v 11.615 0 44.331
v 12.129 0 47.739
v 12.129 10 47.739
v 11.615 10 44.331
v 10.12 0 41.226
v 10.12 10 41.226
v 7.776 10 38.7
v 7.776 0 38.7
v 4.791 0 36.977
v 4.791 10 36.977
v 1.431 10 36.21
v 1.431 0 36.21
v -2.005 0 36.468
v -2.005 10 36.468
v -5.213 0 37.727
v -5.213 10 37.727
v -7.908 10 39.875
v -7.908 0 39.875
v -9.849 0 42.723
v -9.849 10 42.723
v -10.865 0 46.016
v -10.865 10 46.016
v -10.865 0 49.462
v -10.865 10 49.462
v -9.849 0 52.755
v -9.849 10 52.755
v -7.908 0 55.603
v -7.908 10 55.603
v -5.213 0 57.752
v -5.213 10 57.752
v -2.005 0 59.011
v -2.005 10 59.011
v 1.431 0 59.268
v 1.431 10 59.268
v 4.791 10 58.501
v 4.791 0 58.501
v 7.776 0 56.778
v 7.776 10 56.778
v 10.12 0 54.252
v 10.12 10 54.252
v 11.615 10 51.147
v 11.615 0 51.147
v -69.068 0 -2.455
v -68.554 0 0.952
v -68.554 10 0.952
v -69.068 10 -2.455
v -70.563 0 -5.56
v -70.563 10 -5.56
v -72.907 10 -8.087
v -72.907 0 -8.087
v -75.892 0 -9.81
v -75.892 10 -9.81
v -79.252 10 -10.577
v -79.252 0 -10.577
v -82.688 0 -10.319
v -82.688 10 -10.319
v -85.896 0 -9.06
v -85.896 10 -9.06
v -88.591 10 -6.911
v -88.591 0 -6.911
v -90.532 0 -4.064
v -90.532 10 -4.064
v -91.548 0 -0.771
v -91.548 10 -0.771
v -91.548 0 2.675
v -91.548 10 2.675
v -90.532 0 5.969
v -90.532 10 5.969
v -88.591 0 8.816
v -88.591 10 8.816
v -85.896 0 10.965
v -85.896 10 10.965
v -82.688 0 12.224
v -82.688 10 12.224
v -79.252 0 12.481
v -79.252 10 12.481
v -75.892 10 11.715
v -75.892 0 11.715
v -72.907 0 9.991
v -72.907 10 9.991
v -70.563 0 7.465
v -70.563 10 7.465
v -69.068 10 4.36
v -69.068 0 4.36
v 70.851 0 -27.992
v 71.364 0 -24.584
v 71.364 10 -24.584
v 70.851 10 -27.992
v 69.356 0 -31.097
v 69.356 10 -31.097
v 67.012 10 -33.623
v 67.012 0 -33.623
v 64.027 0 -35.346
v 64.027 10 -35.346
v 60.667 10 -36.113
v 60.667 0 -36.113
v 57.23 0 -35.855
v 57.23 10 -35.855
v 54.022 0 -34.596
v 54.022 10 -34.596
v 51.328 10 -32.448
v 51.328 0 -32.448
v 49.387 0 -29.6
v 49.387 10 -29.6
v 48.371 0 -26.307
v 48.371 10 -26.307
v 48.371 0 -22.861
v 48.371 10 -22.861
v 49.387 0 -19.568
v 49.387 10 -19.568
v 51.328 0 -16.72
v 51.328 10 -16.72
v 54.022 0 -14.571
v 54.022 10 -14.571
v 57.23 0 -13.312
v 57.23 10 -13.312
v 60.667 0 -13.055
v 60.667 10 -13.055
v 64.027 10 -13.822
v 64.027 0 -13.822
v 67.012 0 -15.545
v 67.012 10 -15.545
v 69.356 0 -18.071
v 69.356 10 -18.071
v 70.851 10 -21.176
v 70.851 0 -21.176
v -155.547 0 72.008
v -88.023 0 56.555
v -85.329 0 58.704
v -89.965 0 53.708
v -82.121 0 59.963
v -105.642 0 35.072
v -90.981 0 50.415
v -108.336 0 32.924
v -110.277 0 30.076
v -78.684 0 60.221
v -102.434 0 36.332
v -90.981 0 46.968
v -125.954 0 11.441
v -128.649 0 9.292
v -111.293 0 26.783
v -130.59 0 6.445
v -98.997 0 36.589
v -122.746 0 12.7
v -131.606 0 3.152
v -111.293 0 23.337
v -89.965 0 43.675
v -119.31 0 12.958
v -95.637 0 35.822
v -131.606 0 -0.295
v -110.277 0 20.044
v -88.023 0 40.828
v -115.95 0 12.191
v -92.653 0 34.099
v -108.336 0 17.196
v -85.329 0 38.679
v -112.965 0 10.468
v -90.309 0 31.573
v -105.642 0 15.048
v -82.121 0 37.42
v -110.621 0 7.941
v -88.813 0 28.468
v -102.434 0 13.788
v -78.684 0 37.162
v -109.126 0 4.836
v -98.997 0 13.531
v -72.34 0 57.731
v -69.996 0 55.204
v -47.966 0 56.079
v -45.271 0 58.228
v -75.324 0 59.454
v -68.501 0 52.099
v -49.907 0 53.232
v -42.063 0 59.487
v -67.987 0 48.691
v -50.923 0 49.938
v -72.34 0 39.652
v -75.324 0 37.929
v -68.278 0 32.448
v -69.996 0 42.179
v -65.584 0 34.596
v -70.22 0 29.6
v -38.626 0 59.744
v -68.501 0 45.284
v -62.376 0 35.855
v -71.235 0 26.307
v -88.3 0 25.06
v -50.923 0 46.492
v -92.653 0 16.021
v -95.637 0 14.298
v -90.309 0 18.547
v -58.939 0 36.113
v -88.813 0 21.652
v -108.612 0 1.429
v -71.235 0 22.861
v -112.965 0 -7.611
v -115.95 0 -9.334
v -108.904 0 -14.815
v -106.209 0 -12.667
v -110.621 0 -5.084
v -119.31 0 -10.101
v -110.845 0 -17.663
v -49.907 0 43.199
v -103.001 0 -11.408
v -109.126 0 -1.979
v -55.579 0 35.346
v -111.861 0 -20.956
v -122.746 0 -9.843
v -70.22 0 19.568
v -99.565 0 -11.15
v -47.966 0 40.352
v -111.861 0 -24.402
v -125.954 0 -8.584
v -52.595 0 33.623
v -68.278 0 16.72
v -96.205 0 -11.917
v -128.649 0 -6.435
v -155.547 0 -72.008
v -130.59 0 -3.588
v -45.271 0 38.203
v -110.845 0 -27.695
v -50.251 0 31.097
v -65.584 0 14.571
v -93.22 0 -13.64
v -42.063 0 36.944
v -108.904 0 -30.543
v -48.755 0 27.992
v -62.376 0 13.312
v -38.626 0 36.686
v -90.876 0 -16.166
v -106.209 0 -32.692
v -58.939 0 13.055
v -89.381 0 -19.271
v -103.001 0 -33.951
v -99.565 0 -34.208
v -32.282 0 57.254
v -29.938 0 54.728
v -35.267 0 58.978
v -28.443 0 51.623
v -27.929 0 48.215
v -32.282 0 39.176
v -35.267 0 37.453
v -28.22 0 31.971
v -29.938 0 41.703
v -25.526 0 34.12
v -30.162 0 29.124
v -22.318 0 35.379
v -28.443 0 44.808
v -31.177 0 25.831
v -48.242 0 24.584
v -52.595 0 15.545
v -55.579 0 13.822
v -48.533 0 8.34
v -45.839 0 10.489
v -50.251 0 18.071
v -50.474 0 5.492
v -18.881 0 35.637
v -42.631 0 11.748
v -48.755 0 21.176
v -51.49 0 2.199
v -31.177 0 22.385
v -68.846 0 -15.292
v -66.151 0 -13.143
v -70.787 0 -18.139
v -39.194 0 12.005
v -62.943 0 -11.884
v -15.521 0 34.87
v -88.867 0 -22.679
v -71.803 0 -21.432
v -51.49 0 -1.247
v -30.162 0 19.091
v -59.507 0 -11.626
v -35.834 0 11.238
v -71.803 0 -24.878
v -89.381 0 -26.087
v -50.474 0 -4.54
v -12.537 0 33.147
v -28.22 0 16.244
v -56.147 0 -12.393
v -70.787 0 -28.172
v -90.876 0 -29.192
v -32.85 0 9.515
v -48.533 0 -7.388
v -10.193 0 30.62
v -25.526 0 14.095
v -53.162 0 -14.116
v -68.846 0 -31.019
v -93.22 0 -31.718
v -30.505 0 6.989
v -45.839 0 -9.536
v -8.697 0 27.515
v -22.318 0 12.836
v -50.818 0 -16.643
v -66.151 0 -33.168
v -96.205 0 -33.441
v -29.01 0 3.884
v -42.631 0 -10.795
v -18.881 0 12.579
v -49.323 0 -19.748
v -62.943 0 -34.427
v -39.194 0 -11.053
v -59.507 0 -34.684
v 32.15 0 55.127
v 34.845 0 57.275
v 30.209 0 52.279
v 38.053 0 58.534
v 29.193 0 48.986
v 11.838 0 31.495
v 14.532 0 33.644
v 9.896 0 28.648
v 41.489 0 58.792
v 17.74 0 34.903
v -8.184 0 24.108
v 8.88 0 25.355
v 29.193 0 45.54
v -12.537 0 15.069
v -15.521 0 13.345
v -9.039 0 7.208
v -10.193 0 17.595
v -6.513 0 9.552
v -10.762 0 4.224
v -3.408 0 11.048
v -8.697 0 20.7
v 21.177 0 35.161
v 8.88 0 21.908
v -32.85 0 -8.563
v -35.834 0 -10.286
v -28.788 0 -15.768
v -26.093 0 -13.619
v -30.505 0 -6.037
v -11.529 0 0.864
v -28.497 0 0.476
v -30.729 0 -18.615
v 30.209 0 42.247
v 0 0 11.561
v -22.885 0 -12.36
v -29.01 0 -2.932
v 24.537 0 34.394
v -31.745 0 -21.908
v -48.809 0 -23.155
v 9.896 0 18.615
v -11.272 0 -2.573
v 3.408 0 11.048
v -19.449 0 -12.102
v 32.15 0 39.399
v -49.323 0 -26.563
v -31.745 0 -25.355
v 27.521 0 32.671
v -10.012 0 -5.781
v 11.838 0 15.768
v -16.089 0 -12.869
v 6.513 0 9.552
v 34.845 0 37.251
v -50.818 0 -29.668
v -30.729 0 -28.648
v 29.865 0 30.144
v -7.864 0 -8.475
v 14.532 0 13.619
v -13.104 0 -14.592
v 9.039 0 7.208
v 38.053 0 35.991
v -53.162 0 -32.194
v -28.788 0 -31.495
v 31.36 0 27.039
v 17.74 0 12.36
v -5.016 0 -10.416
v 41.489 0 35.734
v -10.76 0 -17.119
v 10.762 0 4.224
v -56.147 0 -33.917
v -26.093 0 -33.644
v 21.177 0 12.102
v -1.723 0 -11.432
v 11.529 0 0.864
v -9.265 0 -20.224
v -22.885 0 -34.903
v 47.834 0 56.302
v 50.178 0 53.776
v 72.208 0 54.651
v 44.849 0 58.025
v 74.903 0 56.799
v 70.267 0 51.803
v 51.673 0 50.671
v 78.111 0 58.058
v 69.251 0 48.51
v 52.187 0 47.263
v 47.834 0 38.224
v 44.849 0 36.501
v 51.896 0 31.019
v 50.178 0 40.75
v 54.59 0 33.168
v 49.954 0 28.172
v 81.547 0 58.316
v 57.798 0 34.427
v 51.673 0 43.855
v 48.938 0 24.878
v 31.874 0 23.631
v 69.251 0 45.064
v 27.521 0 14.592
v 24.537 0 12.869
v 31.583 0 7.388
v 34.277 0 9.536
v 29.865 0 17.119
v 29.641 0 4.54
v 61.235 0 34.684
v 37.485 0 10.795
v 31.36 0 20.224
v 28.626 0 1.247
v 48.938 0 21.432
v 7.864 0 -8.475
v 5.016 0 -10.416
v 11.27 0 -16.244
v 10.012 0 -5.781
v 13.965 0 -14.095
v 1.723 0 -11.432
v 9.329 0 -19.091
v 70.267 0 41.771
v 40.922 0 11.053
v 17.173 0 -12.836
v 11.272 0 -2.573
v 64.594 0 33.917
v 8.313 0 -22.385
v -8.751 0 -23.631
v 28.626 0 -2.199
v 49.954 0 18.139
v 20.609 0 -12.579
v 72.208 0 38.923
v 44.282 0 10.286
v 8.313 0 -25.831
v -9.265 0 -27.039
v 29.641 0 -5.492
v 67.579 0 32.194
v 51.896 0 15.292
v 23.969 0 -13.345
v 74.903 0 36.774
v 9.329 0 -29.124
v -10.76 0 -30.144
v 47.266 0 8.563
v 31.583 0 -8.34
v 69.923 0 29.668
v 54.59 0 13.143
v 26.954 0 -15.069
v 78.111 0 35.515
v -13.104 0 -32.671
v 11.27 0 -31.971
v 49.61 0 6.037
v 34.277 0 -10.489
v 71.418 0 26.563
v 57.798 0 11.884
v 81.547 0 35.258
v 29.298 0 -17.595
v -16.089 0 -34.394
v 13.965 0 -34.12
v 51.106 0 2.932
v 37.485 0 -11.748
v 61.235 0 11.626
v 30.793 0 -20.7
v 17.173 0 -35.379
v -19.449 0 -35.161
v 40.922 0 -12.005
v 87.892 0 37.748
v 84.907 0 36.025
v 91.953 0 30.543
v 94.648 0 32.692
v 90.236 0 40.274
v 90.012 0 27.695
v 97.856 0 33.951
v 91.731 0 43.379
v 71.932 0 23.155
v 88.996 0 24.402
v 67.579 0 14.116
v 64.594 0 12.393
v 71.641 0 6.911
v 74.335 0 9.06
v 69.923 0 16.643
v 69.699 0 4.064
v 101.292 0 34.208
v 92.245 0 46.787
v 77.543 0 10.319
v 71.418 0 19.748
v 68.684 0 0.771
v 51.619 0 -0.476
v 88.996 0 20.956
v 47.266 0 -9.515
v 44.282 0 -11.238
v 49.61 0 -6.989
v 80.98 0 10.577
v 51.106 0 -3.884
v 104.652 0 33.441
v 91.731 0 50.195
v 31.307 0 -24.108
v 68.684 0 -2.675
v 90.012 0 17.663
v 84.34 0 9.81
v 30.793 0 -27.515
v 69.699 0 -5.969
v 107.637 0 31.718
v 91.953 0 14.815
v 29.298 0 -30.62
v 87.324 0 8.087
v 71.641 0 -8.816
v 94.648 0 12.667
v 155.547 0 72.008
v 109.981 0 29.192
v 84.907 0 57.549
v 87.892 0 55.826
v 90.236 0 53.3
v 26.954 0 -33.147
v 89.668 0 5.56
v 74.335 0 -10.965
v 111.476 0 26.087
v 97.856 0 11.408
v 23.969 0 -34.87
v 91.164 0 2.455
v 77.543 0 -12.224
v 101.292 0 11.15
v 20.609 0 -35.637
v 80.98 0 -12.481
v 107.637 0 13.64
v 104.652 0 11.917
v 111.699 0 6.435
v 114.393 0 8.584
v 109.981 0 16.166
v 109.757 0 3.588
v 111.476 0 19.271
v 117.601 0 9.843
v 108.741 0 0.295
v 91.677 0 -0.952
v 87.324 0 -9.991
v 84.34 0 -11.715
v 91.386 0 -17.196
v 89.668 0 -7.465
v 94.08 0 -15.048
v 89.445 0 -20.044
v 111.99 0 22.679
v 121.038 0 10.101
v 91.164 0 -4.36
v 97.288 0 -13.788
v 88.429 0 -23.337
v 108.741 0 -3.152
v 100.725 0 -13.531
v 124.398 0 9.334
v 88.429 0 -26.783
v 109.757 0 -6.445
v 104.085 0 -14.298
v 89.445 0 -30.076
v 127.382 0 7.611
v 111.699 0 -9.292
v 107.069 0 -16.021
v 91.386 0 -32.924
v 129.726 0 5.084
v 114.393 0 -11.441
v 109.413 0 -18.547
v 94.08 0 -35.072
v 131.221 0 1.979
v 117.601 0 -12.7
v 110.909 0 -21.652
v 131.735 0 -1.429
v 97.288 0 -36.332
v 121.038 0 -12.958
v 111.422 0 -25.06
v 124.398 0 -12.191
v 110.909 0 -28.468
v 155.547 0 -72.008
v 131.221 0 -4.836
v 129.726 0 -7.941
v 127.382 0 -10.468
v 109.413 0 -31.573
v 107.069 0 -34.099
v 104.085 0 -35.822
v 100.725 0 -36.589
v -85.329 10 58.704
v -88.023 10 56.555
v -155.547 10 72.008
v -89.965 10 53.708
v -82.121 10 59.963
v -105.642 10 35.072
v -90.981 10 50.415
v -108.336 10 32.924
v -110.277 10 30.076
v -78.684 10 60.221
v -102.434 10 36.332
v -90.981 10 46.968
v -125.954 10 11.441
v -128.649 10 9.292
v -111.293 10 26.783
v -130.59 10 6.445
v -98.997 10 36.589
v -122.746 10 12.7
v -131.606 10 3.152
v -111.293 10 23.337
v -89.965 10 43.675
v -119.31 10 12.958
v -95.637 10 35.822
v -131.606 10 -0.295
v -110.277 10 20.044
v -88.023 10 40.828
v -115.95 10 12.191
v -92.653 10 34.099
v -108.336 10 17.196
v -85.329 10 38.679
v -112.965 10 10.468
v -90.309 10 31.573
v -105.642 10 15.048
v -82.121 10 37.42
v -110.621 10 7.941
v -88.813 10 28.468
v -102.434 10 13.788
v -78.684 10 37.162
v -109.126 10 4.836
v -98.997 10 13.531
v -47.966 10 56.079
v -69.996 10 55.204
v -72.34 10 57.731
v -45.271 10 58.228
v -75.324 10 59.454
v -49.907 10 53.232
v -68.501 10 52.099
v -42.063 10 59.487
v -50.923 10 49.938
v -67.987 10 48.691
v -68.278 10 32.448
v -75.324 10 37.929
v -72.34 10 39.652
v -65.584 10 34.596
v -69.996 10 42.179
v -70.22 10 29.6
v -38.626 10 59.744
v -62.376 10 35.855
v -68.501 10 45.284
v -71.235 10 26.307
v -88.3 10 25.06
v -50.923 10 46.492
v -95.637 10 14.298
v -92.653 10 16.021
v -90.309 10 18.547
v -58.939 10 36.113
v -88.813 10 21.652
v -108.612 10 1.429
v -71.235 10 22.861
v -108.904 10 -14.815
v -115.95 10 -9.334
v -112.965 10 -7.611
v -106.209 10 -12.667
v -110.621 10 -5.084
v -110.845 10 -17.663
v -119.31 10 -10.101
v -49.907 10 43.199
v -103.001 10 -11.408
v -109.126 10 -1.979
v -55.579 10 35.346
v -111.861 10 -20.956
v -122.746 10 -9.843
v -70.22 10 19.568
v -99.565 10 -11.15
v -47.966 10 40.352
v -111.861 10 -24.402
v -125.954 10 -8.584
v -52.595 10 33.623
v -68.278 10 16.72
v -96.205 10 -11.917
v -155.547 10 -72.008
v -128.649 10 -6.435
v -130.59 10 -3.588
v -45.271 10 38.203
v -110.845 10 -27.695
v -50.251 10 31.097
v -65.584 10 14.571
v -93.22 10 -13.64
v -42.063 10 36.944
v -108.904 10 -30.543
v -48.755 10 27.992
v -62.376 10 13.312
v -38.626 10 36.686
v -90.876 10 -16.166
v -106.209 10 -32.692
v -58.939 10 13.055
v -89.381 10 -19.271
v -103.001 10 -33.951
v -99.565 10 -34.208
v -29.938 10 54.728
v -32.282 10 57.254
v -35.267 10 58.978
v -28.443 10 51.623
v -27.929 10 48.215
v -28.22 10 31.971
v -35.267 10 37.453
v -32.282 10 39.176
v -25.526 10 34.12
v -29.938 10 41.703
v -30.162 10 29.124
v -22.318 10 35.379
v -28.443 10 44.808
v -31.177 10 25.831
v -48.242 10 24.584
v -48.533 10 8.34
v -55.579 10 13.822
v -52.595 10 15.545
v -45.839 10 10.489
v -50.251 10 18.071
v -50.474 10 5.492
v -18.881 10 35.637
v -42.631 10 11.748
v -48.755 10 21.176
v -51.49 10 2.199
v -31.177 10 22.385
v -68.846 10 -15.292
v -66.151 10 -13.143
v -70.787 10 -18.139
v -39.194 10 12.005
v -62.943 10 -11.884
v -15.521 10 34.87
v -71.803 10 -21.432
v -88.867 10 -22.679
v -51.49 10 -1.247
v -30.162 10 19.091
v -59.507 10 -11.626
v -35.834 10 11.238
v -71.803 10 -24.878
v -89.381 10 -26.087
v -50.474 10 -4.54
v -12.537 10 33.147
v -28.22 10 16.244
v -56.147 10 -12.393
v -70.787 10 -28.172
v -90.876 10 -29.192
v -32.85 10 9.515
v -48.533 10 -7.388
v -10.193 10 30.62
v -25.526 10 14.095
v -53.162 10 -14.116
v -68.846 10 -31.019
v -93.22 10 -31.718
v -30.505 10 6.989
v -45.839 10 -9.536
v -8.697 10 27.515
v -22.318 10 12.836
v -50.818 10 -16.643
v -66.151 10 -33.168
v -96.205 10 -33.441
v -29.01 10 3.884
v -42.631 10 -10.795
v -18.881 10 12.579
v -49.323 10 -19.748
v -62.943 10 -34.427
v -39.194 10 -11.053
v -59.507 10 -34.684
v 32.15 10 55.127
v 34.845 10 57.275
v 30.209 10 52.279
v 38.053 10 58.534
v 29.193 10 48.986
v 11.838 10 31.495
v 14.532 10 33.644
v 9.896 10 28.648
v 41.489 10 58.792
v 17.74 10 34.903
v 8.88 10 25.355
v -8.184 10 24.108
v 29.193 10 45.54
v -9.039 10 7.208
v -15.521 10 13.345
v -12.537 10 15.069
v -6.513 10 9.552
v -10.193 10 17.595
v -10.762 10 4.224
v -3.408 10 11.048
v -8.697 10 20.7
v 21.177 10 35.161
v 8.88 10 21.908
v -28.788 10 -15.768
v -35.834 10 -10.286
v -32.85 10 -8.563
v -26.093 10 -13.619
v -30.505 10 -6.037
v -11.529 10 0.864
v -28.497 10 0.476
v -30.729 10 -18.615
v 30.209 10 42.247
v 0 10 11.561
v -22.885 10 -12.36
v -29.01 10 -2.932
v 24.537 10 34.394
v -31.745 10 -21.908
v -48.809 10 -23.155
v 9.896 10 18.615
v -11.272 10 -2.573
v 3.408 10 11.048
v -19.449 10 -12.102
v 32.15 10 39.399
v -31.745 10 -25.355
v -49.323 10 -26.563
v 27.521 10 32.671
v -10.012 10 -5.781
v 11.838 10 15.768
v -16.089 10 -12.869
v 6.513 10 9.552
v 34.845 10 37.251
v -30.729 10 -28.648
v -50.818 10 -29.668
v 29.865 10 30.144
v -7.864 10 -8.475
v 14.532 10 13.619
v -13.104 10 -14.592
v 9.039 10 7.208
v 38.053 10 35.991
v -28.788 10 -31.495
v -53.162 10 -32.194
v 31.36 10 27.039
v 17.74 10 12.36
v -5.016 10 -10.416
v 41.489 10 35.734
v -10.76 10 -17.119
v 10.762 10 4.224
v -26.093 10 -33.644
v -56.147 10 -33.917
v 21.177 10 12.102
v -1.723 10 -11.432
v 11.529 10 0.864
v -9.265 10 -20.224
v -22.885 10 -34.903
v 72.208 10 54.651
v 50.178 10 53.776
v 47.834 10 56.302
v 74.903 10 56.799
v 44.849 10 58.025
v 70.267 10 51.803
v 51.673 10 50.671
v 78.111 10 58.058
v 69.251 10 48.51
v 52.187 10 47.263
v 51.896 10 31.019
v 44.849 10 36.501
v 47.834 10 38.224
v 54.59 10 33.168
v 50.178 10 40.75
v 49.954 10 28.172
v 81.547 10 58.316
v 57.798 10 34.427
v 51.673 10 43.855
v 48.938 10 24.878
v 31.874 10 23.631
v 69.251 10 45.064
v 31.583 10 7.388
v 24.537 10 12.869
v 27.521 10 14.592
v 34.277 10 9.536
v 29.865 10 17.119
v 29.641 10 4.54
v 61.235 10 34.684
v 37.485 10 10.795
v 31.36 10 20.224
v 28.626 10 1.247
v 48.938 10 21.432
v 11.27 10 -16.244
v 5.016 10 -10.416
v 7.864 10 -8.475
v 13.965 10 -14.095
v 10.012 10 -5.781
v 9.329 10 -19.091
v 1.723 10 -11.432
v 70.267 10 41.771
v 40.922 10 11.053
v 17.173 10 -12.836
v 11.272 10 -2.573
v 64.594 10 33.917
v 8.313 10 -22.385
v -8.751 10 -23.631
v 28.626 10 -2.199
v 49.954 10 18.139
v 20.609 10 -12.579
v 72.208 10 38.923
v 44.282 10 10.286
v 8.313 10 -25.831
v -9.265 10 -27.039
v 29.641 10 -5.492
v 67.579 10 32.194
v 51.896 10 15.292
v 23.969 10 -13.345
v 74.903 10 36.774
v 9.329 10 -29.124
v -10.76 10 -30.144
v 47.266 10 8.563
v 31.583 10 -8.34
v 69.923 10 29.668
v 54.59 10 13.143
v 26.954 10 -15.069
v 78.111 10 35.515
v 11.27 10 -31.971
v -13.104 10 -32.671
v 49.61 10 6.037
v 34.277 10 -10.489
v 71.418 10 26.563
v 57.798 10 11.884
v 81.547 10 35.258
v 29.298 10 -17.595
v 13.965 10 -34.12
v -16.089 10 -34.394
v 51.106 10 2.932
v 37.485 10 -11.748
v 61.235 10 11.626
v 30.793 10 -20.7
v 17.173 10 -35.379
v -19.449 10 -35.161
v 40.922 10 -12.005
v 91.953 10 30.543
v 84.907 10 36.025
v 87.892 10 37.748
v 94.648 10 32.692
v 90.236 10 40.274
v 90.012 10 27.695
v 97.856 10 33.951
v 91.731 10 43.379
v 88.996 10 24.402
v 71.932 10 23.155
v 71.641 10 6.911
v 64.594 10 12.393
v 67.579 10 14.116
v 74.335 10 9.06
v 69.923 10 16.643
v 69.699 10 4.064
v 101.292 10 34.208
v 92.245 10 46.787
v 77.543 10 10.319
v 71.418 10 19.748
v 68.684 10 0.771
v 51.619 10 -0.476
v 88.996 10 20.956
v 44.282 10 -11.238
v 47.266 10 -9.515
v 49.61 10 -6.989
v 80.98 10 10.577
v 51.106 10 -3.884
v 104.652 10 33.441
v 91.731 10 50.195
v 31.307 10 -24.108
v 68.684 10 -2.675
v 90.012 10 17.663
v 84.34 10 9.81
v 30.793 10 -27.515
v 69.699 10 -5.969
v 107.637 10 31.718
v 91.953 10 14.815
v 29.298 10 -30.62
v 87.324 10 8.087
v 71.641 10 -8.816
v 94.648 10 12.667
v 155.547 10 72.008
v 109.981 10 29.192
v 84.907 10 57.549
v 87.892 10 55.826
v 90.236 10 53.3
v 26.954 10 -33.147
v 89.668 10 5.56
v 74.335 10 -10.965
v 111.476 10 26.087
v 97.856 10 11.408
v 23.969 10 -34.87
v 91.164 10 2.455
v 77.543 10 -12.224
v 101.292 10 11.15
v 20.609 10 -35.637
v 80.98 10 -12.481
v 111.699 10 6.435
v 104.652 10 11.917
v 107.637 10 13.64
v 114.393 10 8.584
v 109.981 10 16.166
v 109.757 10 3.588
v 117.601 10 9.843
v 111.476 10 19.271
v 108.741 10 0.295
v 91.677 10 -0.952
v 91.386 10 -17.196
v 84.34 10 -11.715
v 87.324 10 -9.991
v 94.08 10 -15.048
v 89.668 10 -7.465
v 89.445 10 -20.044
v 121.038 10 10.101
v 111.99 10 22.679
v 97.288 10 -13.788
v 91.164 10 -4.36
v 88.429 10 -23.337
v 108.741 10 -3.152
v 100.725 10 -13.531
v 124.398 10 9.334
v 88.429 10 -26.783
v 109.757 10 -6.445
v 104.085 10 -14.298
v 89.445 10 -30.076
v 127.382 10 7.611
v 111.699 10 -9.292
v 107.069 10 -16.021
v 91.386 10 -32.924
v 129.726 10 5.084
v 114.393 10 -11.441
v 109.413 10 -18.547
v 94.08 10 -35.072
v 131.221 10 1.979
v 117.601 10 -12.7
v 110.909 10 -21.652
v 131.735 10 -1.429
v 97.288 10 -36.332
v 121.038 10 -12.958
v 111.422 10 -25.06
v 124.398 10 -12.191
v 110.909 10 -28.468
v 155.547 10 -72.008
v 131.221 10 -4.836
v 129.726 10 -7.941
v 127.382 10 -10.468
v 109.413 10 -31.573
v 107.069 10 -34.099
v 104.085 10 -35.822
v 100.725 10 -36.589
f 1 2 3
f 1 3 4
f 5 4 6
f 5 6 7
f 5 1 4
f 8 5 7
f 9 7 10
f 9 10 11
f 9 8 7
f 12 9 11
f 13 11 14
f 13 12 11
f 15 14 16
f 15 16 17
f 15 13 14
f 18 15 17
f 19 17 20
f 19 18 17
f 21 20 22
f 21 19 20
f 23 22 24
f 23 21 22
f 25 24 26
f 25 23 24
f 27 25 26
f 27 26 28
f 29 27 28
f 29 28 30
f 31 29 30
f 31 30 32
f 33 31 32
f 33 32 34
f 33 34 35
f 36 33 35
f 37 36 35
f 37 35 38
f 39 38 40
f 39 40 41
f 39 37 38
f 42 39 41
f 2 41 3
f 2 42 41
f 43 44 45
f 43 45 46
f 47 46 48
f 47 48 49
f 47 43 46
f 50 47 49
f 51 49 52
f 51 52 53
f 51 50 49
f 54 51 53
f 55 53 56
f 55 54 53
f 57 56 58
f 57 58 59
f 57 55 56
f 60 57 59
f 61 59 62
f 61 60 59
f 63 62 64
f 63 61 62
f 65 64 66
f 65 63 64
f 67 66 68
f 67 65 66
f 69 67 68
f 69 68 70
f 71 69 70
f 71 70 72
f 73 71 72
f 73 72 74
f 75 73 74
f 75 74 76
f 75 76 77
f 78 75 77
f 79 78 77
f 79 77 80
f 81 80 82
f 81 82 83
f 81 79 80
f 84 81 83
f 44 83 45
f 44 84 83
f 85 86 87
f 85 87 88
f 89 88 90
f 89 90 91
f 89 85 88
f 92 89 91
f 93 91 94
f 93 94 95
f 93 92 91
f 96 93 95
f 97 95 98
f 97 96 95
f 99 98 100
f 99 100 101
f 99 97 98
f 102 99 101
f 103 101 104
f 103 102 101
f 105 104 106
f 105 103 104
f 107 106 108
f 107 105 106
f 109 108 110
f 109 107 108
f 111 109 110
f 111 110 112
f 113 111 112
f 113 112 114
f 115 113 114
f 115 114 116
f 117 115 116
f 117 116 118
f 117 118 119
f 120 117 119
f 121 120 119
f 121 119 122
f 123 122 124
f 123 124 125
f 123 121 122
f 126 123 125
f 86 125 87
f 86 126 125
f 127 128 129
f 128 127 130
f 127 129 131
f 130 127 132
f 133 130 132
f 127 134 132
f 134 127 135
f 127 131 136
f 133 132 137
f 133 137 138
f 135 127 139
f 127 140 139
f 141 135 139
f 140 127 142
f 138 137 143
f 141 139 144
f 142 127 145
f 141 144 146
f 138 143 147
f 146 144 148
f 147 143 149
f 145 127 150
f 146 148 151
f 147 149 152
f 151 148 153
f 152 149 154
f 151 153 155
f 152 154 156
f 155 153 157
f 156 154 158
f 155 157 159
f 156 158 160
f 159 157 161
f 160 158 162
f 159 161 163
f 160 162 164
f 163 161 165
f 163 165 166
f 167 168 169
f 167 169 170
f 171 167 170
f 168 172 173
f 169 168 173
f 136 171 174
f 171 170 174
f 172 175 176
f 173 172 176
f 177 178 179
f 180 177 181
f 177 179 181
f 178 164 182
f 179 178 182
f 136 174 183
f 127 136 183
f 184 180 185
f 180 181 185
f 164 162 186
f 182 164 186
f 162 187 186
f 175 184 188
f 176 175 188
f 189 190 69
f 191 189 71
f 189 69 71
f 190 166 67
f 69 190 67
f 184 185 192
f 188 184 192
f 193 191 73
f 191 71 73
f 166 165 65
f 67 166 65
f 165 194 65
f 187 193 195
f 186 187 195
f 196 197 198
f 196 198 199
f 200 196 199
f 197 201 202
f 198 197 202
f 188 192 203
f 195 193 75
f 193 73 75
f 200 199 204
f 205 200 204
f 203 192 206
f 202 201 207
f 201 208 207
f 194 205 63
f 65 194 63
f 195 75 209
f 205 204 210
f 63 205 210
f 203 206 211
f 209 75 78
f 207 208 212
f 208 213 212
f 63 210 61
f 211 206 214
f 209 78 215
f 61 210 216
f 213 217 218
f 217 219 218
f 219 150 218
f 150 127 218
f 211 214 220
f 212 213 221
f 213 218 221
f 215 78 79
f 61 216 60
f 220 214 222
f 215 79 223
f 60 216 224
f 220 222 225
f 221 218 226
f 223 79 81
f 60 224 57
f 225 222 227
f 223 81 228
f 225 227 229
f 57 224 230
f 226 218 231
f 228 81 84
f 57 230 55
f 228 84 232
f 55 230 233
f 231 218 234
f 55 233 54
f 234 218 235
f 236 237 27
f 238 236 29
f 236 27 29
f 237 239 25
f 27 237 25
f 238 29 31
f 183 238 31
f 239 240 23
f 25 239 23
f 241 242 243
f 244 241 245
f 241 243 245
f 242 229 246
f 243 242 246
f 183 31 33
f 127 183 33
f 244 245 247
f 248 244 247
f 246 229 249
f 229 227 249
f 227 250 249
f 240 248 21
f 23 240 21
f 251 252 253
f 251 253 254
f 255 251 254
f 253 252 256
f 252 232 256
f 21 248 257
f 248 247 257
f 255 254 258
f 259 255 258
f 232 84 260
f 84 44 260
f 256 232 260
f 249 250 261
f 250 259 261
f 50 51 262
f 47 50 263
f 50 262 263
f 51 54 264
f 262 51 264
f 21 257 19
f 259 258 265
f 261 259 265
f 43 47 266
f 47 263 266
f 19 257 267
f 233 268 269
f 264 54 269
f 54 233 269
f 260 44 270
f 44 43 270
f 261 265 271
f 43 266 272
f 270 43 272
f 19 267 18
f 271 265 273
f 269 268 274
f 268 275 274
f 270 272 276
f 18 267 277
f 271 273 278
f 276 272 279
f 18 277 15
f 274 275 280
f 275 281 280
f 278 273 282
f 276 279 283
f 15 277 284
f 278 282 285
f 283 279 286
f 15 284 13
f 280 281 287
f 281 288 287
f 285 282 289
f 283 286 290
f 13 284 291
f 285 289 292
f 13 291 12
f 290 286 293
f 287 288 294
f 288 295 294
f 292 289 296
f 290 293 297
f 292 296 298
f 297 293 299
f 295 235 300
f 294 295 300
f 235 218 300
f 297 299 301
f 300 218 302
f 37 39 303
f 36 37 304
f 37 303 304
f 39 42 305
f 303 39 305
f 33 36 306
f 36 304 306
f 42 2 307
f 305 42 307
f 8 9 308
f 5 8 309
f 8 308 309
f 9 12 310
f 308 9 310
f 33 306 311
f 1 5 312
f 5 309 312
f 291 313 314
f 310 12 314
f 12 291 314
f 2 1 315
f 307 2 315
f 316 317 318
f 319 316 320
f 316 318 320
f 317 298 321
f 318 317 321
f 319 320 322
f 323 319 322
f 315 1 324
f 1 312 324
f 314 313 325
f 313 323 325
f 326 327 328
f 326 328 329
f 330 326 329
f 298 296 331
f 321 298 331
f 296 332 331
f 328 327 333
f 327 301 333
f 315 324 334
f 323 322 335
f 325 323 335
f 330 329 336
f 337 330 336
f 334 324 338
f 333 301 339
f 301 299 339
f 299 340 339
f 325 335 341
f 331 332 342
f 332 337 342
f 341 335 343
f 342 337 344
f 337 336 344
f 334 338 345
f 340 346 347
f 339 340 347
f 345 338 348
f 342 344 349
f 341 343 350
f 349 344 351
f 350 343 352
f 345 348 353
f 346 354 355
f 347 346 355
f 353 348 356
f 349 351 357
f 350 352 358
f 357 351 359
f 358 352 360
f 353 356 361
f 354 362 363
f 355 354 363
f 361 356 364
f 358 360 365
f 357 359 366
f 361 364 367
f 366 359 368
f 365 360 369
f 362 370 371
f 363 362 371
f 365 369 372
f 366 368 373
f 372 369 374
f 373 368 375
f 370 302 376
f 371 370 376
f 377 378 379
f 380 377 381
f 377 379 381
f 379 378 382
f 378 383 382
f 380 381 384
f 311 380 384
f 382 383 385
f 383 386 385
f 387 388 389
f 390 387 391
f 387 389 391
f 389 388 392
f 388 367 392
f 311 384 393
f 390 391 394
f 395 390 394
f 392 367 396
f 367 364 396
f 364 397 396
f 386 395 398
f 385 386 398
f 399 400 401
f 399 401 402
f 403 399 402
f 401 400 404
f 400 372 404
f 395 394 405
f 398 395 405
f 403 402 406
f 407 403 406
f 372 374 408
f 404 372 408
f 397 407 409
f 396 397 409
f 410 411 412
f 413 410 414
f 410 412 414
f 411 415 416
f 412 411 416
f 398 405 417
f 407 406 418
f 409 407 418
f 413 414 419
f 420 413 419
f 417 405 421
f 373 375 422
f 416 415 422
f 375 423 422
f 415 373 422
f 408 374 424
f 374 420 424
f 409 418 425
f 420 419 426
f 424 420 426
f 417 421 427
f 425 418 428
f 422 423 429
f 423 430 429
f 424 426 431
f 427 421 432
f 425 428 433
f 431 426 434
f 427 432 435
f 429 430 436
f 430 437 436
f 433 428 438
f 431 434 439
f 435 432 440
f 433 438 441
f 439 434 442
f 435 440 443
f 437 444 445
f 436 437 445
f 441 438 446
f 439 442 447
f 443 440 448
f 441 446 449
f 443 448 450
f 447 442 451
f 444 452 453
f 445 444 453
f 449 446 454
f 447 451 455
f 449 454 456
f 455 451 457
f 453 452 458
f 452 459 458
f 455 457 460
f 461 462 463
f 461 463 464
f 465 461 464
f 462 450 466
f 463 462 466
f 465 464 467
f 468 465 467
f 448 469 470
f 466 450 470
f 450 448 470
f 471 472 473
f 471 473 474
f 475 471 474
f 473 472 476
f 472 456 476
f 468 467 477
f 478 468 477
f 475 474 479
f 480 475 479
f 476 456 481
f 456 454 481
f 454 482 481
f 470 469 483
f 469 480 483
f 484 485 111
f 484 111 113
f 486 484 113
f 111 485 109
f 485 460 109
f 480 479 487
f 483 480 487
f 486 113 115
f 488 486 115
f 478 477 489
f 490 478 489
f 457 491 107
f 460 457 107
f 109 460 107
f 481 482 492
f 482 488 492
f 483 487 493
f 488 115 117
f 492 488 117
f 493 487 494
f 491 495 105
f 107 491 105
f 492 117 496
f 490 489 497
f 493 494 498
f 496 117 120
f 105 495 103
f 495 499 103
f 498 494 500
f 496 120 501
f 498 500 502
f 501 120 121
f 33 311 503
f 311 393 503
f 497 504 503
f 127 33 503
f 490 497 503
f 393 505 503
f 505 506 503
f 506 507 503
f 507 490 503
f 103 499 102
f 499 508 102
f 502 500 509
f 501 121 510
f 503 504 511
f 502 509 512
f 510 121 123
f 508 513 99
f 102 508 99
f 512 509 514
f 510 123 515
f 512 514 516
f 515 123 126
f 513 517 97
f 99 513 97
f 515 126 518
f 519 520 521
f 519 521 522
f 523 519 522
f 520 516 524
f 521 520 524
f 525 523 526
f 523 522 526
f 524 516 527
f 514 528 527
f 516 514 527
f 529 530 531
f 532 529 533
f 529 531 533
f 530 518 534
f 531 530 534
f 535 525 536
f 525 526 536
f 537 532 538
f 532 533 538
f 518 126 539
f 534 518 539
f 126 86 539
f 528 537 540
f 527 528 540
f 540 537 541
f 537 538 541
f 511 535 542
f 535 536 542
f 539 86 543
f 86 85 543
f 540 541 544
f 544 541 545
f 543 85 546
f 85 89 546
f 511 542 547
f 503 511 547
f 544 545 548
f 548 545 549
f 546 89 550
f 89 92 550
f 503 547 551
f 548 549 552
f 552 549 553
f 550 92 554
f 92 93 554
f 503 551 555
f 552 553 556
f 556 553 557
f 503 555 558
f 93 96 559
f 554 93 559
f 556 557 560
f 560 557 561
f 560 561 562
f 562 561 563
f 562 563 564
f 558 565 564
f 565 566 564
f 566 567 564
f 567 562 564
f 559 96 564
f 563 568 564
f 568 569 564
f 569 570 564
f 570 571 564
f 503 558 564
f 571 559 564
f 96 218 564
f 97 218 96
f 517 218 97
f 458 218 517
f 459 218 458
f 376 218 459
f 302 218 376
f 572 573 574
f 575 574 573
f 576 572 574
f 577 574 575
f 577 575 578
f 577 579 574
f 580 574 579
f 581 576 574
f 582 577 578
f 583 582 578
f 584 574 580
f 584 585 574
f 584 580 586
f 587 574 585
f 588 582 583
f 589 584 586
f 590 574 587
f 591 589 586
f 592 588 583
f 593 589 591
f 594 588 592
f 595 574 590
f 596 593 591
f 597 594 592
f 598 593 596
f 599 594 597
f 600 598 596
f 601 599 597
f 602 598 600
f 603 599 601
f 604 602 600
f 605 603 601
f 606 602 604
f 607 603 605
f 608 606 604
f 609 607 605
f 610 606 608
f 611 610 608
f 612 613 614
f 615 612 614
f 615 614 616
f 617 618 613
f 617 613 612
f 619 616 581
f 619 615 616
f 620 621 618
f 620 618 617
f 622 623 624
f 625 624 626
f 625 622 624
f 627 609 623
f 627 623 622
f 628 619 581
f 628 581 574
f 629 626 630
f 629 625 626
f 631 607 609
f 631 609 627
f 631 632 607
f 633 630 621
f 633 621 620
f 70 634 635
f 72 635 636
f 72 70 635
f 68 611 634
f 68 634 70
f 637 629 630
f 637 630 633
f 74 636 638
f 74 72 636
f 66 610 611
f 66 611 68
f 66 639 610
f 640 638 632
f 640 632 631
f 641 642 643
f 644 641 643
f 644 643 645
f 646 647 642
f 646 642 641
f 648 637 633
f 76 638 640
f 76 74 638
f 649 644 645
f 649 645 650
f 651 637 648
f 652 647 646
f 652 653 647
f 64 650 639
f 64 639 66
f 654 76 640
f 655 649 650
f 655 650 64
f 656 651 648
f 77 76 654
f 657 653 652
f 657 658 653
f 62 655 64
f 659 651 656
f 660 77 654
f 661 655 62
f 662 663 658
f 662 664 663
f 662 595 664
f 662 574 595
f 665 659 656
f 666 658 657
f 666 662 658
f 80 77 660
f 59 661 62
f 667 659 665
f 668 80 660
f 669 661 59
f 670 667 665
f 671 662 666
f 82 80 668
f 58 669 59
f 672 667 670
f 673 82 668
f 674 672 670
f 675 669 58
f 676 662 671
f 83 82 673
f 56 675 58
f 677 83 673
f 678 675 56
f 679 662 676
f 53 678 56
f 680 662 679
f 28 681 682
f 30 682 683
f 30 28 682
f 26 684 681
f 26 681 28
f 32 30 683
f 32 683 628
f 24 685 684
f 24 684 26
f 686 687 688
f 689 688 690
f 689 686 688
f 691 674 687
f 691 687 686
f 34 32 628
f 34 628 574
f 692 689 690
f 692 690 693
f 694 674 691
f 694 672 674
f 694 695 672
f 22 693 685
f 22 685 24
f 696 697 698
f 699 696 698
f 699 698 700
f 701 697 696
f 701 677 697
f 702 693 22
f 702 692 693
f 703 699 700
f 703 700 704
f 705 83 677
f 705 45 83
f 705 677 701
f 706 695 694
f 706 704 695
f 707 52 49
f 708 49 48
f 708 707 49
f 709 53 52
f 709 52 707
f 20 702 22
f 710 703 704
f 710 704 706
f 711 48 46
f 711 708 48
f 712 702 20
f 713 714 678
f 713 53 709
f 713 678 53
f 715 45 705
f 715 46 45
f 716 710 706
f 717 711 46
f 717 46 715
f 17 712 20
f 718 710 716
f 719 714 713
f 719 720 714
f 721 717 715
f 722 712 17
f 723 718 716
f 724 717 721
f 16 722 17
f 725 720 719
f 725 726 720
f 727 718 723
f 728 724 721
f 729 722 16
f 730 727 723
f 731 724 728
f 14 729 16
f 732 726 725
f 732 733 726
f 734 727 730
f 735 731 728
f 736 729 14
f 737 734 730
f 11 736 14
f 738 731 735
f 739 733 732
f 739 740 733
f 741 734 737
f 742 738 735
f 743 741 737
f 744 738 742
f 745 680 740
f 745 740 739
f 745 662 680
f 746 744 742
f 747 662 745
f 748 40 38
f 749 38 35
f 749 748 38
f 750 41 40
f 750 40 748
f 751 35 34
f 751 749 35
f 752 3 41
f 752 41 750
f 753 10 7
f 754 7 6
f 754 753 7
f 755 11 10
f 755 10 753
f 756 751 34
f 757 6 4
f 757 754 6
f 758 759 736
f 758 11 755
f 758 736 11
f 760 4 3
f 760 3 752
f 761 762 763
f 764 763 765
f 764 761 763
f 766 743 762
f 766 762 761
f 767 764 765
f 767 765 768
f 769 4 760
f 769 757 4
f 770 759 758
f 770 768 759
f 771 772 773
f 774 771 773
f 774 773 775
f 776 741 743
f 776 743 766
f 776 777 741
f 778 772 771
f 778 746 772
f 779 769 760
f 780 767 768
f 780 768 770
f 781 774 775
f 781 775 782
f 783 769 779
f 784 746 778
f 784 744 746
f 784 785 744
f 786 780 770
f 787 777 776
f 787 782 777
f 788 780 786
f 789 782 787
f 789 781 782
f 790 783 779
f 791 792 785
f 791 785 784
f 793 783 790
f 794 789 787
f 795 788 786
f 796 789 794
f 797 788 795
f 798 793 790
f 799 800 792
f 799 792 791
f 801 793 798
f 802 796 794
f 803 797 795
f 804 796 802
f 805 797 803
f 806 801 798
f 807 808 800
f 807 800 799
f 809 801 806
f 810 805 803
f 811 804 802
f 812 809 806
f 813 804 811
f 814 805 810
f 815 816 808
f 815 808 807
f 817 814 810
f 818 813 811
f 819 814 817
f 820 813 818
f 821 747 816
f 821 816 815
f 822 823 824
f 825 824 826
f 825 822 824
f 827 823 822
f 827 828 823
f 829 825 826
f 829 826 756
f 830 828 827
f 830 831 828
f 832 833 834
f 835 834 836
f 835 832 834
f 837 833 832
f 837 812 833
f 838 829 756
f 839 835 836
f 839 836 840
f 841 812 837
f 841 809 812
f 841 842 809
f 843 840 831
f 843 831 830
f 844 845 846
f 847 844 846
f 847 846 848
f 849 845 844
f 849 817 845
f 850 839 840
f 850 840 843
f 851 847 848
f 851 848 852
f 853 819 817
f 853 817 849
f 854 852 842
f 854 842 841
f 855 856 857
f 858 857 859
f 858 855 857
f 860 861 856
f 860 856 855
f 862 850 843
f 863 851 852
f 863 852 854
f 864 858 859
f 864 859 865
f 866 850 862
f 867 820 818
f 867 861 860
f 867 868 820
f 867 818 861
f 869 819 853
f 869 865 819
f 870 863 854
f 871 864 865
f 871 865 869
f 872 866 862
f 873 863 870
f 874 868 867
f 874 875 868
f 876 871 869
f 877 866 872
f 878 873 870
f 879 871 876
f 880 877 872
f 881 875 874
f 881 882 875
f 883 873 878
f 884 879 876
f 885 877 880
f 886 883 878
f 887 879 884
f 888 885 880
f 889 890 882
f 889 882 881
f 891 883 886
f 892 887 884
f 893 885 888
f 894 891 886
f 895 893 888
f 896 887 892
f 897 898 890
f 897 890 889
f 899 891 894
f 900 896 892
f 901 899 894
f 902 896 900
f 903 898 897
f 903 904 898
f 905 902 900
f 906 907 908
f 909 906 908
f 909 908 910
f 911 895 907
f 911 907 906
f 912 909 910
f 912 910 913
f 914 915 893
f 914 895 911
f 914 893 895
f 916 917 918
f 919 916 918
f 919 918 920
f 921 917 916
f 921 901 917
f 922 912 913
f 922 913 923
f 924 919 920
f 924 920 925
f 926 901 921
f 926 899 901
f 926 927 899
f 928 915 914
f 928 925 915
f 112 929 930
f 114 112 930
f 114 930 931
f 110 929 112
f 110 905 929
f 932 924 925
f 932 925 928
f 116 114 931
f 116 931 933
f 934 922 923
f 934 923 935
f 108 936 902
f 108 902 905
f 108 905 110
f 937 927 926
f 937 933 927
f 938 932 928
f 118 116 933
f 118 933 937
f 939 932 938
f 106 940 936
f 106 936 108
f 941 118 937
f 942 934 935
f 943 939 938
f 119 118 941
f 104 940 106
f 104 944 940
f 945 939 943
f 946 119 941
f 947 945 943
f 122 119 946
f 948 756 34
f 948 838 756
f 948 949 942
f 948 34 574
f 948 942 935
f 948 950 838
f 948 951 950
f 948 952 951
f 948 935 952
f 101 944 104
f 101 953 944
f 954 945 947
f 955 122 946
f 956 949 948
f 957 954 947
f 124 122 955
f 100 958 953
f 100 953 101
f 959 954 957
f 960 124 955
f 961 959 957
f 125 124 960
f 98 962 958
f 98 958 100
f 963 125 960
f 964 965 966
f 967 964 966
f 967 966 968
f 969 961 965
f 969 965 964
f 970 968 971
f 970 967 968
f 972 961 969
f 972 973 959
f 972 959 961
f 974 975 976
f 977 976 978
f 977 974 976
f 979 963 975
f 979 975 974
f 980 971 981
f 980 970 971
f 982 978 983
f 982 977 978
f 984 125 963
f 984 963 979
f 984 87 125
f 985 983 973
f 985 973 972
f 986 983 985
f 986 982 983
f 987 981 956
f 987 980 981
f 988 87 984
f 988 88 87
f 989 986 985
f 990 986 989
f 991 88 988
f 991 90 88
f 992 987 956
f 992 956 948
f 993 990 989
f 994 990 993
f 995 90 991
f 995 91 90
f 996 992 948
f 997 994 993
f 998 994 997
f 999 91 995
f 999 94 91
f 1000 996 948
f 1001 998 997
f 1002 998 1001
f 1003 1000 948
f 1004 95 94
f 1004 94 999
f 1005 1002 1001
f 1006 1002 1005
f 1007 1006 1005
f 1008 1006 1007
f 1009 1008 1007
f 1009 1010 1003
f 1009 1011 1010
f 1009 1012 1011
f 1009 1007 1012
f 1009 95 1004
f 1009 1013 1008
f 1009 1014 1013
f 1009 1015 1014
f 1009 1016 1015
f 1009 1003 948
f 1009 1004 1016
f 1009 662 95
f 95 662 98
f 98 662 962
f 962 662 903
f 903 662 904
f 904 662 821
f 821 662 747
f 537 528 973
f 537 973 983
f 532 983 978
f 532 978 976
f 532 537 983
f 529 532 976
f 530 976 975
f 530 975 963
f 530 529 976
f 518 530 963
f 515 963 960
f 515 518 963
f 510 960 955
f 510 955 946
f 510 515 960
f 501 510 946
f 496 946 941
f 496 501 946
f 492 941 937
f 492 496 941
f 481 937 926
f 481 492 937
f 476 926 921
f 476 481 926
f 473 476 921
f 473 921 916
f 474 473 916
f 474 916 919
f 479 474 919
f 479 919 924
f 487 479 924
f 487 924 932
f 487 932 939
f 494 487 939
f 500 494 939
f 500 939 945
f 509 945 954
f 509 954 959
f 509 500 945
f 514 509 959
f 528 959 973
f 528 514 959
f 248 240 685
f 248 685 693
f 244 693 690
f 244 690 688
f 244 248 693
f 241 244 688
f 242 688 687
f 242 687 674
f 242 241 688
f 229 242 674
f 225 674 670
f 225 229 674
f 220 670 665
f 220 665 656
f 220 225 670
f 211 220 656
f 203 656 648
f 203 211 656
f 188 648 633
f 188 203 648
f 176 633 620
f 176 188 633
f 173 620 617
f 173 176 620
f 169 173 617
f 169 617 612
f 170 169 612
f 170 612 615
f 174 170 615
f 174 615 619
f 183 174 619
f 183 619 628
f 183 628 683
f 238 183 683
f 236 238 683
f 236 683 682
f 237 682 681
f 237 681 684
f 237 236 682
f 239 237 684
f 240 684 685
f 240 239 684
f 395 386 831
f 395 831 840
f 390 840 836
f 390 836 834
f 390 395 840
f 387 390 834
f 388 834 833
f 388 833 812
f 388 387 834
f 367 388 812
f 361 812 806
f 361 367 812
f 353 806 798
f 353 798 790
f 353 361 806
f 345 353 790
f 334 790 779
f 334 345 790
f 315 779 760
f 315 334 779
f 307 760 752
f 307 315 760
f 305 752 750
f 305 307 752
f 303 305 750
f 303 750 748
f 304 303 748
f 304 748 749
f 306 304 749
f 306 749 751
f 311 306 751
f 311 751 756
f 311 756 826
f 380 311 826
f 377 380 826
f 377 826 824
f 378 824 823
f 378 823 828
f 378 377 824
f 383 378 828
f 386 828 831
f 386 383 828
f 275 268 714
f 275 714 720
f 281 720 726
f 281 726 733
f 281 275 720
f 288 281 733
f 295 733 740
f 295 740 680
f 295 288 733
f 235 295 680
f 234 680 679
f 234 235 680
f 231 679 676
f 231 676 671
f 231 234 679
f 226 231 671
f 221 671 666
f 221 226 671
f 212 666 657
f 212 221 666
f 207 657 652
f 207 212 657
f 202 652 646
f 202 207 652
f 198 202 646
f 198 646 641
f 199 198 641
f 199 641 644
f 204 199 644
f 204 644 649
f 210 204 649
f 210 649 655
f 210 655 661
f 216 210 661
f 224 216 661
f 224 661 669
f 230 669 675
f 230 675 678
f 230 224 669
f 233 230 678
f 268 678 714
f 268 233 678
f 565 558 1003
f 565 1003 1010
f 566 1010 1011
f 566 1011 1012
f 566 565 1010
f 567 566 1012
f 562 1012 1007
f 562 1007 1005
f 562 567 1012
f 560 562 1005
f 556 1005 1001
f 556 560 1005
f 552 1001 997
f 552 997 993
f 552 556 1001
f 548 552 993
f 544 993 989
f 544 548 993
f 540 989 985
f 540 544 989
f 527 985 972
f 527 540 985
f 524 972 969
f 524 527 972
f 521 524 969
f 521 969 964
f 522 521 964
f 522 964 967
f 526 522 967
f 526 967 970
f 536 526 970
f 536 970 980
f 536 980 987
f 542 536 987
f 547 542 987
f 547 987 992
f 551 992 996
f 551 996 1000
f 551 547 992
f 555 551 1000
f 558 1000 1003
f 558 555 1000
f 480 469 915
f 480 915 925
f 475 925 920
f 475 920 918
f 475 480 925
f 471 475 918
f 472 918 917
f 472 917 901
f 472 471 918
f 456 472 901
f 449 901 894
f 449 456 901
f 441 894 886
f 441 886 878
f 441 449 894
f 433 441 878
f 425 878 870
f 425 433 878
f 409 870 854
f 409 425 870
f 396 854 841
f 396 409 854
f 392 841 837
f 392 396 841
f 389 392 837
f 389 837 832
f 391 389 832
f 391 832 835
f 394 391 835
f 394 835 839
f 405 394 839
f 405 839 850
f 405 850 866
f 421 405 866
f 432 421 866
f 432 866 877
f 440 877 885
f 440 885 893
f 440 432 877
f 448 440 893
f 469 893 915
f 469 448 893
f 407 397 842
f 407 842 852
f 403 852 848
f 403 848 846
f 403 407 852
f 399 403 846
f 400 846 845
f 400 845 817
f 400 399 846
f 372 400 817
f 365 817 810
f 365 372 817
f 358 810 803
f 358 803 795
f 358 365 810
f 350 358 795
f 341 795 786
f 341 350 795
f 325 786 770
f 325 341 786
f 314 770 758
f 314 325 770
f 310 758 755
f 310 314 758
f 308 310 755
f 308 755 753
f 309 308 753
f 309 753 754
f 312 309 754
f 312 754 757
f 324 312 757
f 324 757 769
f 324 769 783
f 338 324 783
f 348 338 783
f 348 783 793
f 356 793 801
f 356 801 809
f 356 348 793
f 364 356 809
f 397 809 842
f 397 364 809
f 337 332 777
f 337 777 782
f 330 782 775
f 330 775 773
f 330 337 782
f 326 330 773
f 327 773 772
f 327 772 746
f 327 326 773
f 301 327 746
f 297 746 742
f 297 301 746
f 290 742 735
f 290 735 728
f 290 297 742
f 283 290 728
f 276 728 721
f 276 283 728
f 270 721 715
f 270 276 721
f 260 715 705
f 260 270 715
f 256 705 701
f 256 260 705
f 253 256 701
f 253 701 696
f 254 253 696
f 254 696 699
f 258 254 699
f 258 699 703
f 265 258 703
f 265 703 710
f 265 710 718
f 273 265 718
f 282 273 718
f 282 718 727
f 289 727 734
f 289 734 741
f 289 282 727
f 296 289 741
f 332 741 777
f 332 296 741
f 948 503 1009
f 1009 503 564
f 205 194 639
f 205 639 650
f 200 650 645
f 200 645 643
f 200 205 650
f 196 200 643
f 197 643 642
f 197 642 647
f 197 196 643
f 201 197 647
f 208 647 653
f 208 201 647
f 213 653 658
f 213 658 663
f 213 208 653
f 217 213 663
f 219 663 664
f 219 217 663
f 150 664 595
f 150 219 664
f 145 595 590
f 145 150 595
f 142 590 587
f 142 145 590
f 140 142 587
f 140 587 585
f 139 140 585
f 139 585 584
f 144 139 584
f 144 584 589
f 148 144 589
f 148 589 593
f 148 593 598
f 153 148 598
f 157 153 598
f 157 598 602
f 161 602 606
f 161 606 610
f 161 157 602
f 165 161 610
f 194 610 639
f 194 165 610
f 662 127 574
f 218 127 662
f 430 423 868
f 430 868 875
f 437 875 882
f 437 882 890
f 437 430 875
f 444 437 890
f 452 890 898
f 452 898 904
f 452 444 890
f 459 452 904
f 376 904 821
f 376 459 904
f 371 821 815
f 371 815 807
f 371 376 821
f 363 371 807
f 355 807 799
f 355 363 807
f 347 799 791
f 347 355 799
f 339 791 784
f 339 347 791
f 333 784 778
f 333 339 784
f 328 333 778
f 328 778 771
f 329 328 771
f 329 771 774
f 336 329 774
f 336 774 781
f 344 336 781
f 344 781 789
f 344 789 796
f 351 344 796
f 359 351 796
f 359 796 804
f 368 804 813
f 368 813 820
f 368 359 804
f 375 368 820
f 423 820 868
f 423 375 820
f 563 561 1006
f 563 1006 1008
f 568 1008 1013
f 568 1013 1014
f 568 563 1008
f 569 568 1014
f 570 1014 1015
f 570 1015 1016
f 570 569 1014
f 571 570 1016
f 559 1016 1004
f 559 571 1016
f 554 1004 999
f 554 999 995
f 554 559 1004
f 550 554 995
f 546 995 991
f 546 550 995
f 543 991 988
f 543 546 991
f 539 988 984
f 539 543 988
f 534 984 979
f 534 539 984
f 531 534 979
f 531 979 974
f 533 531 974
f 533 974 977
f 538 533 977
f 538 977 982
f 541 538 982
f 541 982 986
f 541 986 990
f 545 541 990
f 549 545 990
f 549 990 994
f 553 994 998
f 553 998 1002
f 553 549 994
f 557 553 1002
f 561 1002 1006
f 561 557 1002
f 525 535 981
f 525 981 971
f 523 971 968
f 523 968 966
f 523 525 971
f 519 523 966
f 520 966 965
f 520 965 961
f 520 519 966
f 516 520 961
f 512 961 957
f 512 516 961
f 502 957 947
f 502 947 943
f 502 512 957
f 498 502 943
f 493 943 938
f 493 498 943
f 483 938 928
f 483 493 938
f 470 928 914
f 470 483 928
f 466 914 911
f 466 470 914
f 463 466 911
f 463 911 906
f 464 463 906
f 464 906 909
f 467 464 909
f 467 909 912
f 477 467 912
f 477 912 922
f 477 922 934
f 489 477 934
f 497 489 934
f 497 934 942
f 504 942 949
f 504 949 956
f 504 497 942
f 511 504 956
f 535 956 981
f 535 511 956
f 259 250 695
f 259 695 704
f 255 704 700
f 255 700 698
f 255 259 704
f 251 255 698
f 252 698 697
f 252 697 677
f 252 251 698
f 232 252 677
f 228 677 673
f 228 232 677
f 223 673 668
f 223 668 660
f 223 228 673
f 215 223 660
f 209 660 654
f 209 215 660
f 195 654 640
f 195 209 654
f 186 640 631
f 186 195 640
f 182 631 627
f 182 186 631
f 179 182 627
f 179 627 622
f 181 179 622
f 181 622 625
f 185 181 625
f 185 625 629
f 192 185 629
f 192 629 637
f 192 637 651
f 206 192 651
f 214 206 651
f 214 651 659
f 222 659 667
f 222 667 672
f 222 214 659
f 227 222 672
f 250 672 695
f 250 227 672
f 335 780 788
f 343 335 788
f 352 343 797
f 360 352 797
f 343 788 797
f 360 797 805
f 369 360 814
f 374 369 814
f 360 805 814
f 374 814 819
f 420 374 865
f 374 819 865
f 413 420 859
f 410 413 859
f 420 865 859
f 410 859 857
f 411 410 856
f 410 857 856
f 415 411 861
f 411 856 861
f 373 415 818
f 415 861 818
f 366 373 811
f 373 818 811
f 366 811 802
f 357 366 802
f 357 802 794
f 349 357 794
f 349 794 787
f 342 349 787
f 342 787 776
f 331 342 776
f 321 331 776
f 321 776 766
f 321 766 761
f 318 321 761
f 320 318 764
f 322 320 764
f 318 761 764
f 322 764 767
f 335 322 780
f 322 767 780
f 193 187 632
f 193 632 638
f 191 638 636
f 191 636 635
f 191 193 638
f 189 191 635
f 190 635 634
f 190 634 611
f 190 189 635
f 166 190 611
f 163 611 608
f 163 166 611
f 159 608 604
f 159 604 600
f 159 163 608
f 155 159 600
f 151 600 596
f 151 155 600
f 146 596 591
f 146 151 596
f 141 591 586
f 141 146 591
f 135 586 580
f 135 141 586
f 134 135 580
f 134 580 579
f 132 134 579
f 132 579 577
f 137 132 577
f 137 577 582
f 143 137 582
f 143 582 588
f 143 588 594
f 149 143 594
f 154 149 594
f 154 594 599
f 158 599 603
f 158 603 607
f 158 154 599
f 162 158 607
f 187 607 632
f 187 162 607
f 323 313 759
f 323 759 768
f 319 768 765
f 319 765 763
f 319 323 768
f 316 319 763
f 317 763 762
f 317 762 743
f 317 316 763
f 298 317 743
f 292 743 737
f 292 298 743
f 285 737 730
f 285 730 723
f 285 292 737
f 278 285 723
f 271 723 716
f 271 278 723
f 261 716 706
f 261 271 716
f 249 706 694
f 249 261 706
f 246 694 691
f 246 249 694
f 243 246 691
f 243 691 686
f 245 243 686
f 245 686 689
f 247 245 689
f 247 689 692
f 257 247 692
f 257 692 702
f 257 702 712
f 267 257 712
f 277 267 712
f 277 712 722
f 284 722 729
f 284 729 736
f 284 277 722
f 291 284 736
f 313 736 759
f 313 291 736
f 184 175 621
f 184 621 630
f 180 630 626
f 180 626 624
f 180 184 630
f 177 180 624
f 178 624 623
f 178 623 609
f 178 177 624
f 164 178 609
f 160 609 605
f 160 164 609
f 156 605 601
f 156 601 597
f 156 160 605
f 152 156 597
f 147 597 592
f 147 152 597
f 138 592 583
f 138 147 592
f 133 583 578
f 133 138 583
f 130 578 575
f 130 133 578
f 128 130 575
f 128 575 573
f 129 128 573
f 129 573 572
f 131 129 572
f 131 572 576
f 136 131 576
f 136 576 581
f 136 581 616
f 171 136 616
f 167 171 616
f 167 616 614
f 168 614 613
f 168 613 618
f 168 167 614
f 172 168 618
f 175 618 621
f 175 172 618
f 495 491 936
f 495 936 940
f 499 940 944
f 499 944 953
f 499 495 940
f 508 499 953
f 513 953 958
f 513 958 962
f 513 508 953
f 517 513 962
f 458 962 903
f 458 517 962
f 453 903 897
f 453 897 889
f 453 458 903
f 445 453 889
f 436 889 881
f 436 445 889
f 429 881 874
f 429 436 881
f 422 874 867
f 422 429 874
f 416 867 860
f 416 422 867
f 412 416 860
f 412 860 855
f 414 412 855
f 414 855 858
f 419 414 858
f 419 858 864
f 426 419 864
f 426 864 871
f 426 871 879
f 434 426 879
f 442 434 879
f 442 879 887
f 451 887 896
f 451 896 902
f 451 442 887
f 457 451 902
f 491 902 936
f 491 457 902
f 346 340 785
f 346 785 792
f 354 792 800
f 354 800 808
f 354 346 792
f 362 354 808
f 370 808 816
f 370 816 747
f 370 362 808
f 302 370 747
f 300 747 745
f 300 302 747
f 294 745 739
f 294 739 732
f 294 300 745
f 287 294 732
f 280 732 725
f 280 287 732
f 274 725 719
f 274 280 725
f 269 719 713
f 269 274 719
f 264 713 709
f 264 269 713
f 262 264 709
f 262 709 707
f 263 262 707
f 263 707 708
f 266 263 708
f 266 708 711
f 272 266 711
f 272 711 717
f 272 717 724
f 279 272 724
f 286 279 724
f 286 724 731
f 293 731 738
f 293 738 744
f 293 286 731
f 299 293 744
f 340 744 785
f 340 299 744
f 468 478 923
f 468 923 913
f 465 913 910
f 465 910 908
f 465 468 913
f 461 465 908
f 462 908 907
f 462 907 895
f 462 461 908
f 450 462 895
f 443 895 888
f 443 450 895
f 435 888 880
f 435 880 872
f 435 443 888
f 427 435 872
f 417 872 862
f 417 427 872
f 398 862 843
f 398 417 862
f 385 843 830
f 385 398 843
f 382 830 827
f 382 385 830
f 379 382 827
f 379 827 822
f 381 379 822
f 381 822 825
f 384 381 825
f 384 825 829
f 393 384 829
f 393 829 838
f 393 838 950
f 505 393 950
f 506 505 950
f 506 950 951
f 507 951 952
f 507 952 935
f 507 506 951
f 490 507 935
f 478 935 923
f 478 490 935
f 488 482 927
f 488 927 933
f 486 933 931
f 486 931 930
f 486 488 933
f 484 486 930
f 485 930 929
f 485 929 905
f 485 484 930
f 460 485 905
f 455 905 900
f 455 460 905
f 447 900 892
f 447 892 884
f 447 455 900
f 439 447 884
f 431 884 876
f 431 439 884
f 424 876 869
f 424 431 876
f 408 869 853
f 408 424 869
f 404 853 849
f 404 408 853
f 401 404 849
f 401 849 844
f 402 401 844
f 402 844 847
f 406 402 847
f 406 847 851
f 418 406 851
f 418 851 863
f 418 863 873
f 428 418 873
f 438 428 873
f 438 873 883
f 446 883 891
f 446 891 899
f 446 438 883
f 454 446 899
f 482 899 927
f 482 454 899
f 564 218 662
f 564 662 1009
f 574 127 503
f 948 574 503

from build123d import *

# Parameters (mm, degrees)
SKETCH1_W               = 311.094159216
SKETCH1_H               = 144.015986956
BOSS_EXTRUDE1_DEPTH     = 10
SKETCH2_R               = 11.561372413
CUT_EXTRUDE1_DEPTH      = 10
FILL_PATTERN1_OUTLINE_R = 11.561372413
FILL_PATTERN1_DEPTH     = 10


# Read off the part's stored shape, not the designer's step: Fill Pattern1
with BuildPart() as part:
    # Sketch1 → Boss-Extrude1 (new body)
    with BuildSketch(Plane(origin=(0, 0, 0), x_dir=(1, 0, 0), z_dir=(0, 1, 0))):
        Rectangle(SKETCH1_W, SKETCH1_H)
    extrude(amount=BOSS_EXTRUDE1_DEPTH)

    # Sketch2 → Cut-Extrude1 (cut)
    with BuildSketch(Plane(origin=(0, 10, 0), x_dir=(1, 0, 0), z_dir=(0, 1, 0))):
        with Locations(Location((0, 0, 0), (0, 0, 270))):
            Circle(SKETCH2_R)
    extrude(amount=-CUT_EXTRUDE1_DEPTH, mode=Mode.SUBTRACT)

    # Fill Pattern1 outline → Fill Pattern1 (cut)
    with BuildSketch(Plane(origin=(0, 0, 0), x_dir=(1, 0, 0), z_dir=(0, 1, 0))):
        with Locations((-120.173715992, -1.428513712)):
            Circle(FILL_PATTERN1_OUTLINE_R)
        with Locations((80.683289444, -46.786810115)):
            Circle(FILL_PATTERN1_OUTLINE_R)
        with Locations((99.861023935, 25.060004388)):
            Circle(FILL_PATTERN1_OUTLINE_R)
        with Locations((80.115810661, 0.952342474)):
            Circle(FILL_PATTERN1_OUTLINE_R)
        with Locations((60.370597387, -23.155319439)):
            Circle(FILL_PATTERN1_OUTLINE_R)
        with Locations((100.428502718, -22.679148202)):
            Circle(FILL_PATTERN1_OUTLINE_R)
        with Locations((120.173715992, 1.428513712)):
            Circle(FILL_PATTERN1_OUTLINE_R)
        with Locations((-20.312692057, 23.631490676)):
            Circle(FILL_PATTERN1_OUTLINE_R)
        with Locations((-40.057905331, -0.476171237)):
            Circle(FILL_PATTERN1_OUTLINE_R)
        with Locations((-59.803118605, -24.583833151)):
            Circle(FILL_PATTERN1_OUTLINE_R)
        with Locations((-79.548331879, -48.691495064)):
            Circle(FILL_PATTERN1_OUTLINE_R)
        with Locations((-100.428502718, 22.679148202)):
            Circle(FILL_PATTERN1_OUTLINE_R)
        with Locations((-99.861023935, -25.060004388)):
            Circle(FILL_PATTERN1_OUTLINE_R)
        with Locations((-80.115810661, -0.952342474)):
            Circle(FILL_PATTERN1_OUTLINE_R)
        with Locations((-60.370597387, 23.155319439)):
            Circle(FILL_PATTERN1_OUTLINE_R)
        with Locations((20.312692057, -23.631490676)):
            Circle(FILL_PATTERN1_OUTLINE_R)
        with Locations((40.057905331, 0.476171237)):
            Circle(FILL_PATTERN1_OUTLINE_R)
        with Locations((59.803118605, 24.583833151)):
            Circle(FILL_PATTERN1_OUTLINE_R)
        with Locations((40.625384113, -47.262981352)):
            Circle(FILL_PATTERN1_OUTLINE_R)
        with Locations((-39.490426548, -48.215323827)):
            Circle(FILL_PATTERN1_OUTLINE_R)
        with Locations((-19.745213274, -24.107661913)):
            Circle(FILL_PATTERN1_OUTLINE_R)
        with Locations((19.745213274, 24.107661913)):
            Circle(FILL_PATTERN1_OUTLINE_R)
        with Locations((0.567478783, -47.73915259)):
            Circle(FILL_PATTERN1_OUTLINE_R)
    extrude(amount=FILL_PATTERN1_DEPTH, mode=Mode.SUBTRACT)


solid = part.part
